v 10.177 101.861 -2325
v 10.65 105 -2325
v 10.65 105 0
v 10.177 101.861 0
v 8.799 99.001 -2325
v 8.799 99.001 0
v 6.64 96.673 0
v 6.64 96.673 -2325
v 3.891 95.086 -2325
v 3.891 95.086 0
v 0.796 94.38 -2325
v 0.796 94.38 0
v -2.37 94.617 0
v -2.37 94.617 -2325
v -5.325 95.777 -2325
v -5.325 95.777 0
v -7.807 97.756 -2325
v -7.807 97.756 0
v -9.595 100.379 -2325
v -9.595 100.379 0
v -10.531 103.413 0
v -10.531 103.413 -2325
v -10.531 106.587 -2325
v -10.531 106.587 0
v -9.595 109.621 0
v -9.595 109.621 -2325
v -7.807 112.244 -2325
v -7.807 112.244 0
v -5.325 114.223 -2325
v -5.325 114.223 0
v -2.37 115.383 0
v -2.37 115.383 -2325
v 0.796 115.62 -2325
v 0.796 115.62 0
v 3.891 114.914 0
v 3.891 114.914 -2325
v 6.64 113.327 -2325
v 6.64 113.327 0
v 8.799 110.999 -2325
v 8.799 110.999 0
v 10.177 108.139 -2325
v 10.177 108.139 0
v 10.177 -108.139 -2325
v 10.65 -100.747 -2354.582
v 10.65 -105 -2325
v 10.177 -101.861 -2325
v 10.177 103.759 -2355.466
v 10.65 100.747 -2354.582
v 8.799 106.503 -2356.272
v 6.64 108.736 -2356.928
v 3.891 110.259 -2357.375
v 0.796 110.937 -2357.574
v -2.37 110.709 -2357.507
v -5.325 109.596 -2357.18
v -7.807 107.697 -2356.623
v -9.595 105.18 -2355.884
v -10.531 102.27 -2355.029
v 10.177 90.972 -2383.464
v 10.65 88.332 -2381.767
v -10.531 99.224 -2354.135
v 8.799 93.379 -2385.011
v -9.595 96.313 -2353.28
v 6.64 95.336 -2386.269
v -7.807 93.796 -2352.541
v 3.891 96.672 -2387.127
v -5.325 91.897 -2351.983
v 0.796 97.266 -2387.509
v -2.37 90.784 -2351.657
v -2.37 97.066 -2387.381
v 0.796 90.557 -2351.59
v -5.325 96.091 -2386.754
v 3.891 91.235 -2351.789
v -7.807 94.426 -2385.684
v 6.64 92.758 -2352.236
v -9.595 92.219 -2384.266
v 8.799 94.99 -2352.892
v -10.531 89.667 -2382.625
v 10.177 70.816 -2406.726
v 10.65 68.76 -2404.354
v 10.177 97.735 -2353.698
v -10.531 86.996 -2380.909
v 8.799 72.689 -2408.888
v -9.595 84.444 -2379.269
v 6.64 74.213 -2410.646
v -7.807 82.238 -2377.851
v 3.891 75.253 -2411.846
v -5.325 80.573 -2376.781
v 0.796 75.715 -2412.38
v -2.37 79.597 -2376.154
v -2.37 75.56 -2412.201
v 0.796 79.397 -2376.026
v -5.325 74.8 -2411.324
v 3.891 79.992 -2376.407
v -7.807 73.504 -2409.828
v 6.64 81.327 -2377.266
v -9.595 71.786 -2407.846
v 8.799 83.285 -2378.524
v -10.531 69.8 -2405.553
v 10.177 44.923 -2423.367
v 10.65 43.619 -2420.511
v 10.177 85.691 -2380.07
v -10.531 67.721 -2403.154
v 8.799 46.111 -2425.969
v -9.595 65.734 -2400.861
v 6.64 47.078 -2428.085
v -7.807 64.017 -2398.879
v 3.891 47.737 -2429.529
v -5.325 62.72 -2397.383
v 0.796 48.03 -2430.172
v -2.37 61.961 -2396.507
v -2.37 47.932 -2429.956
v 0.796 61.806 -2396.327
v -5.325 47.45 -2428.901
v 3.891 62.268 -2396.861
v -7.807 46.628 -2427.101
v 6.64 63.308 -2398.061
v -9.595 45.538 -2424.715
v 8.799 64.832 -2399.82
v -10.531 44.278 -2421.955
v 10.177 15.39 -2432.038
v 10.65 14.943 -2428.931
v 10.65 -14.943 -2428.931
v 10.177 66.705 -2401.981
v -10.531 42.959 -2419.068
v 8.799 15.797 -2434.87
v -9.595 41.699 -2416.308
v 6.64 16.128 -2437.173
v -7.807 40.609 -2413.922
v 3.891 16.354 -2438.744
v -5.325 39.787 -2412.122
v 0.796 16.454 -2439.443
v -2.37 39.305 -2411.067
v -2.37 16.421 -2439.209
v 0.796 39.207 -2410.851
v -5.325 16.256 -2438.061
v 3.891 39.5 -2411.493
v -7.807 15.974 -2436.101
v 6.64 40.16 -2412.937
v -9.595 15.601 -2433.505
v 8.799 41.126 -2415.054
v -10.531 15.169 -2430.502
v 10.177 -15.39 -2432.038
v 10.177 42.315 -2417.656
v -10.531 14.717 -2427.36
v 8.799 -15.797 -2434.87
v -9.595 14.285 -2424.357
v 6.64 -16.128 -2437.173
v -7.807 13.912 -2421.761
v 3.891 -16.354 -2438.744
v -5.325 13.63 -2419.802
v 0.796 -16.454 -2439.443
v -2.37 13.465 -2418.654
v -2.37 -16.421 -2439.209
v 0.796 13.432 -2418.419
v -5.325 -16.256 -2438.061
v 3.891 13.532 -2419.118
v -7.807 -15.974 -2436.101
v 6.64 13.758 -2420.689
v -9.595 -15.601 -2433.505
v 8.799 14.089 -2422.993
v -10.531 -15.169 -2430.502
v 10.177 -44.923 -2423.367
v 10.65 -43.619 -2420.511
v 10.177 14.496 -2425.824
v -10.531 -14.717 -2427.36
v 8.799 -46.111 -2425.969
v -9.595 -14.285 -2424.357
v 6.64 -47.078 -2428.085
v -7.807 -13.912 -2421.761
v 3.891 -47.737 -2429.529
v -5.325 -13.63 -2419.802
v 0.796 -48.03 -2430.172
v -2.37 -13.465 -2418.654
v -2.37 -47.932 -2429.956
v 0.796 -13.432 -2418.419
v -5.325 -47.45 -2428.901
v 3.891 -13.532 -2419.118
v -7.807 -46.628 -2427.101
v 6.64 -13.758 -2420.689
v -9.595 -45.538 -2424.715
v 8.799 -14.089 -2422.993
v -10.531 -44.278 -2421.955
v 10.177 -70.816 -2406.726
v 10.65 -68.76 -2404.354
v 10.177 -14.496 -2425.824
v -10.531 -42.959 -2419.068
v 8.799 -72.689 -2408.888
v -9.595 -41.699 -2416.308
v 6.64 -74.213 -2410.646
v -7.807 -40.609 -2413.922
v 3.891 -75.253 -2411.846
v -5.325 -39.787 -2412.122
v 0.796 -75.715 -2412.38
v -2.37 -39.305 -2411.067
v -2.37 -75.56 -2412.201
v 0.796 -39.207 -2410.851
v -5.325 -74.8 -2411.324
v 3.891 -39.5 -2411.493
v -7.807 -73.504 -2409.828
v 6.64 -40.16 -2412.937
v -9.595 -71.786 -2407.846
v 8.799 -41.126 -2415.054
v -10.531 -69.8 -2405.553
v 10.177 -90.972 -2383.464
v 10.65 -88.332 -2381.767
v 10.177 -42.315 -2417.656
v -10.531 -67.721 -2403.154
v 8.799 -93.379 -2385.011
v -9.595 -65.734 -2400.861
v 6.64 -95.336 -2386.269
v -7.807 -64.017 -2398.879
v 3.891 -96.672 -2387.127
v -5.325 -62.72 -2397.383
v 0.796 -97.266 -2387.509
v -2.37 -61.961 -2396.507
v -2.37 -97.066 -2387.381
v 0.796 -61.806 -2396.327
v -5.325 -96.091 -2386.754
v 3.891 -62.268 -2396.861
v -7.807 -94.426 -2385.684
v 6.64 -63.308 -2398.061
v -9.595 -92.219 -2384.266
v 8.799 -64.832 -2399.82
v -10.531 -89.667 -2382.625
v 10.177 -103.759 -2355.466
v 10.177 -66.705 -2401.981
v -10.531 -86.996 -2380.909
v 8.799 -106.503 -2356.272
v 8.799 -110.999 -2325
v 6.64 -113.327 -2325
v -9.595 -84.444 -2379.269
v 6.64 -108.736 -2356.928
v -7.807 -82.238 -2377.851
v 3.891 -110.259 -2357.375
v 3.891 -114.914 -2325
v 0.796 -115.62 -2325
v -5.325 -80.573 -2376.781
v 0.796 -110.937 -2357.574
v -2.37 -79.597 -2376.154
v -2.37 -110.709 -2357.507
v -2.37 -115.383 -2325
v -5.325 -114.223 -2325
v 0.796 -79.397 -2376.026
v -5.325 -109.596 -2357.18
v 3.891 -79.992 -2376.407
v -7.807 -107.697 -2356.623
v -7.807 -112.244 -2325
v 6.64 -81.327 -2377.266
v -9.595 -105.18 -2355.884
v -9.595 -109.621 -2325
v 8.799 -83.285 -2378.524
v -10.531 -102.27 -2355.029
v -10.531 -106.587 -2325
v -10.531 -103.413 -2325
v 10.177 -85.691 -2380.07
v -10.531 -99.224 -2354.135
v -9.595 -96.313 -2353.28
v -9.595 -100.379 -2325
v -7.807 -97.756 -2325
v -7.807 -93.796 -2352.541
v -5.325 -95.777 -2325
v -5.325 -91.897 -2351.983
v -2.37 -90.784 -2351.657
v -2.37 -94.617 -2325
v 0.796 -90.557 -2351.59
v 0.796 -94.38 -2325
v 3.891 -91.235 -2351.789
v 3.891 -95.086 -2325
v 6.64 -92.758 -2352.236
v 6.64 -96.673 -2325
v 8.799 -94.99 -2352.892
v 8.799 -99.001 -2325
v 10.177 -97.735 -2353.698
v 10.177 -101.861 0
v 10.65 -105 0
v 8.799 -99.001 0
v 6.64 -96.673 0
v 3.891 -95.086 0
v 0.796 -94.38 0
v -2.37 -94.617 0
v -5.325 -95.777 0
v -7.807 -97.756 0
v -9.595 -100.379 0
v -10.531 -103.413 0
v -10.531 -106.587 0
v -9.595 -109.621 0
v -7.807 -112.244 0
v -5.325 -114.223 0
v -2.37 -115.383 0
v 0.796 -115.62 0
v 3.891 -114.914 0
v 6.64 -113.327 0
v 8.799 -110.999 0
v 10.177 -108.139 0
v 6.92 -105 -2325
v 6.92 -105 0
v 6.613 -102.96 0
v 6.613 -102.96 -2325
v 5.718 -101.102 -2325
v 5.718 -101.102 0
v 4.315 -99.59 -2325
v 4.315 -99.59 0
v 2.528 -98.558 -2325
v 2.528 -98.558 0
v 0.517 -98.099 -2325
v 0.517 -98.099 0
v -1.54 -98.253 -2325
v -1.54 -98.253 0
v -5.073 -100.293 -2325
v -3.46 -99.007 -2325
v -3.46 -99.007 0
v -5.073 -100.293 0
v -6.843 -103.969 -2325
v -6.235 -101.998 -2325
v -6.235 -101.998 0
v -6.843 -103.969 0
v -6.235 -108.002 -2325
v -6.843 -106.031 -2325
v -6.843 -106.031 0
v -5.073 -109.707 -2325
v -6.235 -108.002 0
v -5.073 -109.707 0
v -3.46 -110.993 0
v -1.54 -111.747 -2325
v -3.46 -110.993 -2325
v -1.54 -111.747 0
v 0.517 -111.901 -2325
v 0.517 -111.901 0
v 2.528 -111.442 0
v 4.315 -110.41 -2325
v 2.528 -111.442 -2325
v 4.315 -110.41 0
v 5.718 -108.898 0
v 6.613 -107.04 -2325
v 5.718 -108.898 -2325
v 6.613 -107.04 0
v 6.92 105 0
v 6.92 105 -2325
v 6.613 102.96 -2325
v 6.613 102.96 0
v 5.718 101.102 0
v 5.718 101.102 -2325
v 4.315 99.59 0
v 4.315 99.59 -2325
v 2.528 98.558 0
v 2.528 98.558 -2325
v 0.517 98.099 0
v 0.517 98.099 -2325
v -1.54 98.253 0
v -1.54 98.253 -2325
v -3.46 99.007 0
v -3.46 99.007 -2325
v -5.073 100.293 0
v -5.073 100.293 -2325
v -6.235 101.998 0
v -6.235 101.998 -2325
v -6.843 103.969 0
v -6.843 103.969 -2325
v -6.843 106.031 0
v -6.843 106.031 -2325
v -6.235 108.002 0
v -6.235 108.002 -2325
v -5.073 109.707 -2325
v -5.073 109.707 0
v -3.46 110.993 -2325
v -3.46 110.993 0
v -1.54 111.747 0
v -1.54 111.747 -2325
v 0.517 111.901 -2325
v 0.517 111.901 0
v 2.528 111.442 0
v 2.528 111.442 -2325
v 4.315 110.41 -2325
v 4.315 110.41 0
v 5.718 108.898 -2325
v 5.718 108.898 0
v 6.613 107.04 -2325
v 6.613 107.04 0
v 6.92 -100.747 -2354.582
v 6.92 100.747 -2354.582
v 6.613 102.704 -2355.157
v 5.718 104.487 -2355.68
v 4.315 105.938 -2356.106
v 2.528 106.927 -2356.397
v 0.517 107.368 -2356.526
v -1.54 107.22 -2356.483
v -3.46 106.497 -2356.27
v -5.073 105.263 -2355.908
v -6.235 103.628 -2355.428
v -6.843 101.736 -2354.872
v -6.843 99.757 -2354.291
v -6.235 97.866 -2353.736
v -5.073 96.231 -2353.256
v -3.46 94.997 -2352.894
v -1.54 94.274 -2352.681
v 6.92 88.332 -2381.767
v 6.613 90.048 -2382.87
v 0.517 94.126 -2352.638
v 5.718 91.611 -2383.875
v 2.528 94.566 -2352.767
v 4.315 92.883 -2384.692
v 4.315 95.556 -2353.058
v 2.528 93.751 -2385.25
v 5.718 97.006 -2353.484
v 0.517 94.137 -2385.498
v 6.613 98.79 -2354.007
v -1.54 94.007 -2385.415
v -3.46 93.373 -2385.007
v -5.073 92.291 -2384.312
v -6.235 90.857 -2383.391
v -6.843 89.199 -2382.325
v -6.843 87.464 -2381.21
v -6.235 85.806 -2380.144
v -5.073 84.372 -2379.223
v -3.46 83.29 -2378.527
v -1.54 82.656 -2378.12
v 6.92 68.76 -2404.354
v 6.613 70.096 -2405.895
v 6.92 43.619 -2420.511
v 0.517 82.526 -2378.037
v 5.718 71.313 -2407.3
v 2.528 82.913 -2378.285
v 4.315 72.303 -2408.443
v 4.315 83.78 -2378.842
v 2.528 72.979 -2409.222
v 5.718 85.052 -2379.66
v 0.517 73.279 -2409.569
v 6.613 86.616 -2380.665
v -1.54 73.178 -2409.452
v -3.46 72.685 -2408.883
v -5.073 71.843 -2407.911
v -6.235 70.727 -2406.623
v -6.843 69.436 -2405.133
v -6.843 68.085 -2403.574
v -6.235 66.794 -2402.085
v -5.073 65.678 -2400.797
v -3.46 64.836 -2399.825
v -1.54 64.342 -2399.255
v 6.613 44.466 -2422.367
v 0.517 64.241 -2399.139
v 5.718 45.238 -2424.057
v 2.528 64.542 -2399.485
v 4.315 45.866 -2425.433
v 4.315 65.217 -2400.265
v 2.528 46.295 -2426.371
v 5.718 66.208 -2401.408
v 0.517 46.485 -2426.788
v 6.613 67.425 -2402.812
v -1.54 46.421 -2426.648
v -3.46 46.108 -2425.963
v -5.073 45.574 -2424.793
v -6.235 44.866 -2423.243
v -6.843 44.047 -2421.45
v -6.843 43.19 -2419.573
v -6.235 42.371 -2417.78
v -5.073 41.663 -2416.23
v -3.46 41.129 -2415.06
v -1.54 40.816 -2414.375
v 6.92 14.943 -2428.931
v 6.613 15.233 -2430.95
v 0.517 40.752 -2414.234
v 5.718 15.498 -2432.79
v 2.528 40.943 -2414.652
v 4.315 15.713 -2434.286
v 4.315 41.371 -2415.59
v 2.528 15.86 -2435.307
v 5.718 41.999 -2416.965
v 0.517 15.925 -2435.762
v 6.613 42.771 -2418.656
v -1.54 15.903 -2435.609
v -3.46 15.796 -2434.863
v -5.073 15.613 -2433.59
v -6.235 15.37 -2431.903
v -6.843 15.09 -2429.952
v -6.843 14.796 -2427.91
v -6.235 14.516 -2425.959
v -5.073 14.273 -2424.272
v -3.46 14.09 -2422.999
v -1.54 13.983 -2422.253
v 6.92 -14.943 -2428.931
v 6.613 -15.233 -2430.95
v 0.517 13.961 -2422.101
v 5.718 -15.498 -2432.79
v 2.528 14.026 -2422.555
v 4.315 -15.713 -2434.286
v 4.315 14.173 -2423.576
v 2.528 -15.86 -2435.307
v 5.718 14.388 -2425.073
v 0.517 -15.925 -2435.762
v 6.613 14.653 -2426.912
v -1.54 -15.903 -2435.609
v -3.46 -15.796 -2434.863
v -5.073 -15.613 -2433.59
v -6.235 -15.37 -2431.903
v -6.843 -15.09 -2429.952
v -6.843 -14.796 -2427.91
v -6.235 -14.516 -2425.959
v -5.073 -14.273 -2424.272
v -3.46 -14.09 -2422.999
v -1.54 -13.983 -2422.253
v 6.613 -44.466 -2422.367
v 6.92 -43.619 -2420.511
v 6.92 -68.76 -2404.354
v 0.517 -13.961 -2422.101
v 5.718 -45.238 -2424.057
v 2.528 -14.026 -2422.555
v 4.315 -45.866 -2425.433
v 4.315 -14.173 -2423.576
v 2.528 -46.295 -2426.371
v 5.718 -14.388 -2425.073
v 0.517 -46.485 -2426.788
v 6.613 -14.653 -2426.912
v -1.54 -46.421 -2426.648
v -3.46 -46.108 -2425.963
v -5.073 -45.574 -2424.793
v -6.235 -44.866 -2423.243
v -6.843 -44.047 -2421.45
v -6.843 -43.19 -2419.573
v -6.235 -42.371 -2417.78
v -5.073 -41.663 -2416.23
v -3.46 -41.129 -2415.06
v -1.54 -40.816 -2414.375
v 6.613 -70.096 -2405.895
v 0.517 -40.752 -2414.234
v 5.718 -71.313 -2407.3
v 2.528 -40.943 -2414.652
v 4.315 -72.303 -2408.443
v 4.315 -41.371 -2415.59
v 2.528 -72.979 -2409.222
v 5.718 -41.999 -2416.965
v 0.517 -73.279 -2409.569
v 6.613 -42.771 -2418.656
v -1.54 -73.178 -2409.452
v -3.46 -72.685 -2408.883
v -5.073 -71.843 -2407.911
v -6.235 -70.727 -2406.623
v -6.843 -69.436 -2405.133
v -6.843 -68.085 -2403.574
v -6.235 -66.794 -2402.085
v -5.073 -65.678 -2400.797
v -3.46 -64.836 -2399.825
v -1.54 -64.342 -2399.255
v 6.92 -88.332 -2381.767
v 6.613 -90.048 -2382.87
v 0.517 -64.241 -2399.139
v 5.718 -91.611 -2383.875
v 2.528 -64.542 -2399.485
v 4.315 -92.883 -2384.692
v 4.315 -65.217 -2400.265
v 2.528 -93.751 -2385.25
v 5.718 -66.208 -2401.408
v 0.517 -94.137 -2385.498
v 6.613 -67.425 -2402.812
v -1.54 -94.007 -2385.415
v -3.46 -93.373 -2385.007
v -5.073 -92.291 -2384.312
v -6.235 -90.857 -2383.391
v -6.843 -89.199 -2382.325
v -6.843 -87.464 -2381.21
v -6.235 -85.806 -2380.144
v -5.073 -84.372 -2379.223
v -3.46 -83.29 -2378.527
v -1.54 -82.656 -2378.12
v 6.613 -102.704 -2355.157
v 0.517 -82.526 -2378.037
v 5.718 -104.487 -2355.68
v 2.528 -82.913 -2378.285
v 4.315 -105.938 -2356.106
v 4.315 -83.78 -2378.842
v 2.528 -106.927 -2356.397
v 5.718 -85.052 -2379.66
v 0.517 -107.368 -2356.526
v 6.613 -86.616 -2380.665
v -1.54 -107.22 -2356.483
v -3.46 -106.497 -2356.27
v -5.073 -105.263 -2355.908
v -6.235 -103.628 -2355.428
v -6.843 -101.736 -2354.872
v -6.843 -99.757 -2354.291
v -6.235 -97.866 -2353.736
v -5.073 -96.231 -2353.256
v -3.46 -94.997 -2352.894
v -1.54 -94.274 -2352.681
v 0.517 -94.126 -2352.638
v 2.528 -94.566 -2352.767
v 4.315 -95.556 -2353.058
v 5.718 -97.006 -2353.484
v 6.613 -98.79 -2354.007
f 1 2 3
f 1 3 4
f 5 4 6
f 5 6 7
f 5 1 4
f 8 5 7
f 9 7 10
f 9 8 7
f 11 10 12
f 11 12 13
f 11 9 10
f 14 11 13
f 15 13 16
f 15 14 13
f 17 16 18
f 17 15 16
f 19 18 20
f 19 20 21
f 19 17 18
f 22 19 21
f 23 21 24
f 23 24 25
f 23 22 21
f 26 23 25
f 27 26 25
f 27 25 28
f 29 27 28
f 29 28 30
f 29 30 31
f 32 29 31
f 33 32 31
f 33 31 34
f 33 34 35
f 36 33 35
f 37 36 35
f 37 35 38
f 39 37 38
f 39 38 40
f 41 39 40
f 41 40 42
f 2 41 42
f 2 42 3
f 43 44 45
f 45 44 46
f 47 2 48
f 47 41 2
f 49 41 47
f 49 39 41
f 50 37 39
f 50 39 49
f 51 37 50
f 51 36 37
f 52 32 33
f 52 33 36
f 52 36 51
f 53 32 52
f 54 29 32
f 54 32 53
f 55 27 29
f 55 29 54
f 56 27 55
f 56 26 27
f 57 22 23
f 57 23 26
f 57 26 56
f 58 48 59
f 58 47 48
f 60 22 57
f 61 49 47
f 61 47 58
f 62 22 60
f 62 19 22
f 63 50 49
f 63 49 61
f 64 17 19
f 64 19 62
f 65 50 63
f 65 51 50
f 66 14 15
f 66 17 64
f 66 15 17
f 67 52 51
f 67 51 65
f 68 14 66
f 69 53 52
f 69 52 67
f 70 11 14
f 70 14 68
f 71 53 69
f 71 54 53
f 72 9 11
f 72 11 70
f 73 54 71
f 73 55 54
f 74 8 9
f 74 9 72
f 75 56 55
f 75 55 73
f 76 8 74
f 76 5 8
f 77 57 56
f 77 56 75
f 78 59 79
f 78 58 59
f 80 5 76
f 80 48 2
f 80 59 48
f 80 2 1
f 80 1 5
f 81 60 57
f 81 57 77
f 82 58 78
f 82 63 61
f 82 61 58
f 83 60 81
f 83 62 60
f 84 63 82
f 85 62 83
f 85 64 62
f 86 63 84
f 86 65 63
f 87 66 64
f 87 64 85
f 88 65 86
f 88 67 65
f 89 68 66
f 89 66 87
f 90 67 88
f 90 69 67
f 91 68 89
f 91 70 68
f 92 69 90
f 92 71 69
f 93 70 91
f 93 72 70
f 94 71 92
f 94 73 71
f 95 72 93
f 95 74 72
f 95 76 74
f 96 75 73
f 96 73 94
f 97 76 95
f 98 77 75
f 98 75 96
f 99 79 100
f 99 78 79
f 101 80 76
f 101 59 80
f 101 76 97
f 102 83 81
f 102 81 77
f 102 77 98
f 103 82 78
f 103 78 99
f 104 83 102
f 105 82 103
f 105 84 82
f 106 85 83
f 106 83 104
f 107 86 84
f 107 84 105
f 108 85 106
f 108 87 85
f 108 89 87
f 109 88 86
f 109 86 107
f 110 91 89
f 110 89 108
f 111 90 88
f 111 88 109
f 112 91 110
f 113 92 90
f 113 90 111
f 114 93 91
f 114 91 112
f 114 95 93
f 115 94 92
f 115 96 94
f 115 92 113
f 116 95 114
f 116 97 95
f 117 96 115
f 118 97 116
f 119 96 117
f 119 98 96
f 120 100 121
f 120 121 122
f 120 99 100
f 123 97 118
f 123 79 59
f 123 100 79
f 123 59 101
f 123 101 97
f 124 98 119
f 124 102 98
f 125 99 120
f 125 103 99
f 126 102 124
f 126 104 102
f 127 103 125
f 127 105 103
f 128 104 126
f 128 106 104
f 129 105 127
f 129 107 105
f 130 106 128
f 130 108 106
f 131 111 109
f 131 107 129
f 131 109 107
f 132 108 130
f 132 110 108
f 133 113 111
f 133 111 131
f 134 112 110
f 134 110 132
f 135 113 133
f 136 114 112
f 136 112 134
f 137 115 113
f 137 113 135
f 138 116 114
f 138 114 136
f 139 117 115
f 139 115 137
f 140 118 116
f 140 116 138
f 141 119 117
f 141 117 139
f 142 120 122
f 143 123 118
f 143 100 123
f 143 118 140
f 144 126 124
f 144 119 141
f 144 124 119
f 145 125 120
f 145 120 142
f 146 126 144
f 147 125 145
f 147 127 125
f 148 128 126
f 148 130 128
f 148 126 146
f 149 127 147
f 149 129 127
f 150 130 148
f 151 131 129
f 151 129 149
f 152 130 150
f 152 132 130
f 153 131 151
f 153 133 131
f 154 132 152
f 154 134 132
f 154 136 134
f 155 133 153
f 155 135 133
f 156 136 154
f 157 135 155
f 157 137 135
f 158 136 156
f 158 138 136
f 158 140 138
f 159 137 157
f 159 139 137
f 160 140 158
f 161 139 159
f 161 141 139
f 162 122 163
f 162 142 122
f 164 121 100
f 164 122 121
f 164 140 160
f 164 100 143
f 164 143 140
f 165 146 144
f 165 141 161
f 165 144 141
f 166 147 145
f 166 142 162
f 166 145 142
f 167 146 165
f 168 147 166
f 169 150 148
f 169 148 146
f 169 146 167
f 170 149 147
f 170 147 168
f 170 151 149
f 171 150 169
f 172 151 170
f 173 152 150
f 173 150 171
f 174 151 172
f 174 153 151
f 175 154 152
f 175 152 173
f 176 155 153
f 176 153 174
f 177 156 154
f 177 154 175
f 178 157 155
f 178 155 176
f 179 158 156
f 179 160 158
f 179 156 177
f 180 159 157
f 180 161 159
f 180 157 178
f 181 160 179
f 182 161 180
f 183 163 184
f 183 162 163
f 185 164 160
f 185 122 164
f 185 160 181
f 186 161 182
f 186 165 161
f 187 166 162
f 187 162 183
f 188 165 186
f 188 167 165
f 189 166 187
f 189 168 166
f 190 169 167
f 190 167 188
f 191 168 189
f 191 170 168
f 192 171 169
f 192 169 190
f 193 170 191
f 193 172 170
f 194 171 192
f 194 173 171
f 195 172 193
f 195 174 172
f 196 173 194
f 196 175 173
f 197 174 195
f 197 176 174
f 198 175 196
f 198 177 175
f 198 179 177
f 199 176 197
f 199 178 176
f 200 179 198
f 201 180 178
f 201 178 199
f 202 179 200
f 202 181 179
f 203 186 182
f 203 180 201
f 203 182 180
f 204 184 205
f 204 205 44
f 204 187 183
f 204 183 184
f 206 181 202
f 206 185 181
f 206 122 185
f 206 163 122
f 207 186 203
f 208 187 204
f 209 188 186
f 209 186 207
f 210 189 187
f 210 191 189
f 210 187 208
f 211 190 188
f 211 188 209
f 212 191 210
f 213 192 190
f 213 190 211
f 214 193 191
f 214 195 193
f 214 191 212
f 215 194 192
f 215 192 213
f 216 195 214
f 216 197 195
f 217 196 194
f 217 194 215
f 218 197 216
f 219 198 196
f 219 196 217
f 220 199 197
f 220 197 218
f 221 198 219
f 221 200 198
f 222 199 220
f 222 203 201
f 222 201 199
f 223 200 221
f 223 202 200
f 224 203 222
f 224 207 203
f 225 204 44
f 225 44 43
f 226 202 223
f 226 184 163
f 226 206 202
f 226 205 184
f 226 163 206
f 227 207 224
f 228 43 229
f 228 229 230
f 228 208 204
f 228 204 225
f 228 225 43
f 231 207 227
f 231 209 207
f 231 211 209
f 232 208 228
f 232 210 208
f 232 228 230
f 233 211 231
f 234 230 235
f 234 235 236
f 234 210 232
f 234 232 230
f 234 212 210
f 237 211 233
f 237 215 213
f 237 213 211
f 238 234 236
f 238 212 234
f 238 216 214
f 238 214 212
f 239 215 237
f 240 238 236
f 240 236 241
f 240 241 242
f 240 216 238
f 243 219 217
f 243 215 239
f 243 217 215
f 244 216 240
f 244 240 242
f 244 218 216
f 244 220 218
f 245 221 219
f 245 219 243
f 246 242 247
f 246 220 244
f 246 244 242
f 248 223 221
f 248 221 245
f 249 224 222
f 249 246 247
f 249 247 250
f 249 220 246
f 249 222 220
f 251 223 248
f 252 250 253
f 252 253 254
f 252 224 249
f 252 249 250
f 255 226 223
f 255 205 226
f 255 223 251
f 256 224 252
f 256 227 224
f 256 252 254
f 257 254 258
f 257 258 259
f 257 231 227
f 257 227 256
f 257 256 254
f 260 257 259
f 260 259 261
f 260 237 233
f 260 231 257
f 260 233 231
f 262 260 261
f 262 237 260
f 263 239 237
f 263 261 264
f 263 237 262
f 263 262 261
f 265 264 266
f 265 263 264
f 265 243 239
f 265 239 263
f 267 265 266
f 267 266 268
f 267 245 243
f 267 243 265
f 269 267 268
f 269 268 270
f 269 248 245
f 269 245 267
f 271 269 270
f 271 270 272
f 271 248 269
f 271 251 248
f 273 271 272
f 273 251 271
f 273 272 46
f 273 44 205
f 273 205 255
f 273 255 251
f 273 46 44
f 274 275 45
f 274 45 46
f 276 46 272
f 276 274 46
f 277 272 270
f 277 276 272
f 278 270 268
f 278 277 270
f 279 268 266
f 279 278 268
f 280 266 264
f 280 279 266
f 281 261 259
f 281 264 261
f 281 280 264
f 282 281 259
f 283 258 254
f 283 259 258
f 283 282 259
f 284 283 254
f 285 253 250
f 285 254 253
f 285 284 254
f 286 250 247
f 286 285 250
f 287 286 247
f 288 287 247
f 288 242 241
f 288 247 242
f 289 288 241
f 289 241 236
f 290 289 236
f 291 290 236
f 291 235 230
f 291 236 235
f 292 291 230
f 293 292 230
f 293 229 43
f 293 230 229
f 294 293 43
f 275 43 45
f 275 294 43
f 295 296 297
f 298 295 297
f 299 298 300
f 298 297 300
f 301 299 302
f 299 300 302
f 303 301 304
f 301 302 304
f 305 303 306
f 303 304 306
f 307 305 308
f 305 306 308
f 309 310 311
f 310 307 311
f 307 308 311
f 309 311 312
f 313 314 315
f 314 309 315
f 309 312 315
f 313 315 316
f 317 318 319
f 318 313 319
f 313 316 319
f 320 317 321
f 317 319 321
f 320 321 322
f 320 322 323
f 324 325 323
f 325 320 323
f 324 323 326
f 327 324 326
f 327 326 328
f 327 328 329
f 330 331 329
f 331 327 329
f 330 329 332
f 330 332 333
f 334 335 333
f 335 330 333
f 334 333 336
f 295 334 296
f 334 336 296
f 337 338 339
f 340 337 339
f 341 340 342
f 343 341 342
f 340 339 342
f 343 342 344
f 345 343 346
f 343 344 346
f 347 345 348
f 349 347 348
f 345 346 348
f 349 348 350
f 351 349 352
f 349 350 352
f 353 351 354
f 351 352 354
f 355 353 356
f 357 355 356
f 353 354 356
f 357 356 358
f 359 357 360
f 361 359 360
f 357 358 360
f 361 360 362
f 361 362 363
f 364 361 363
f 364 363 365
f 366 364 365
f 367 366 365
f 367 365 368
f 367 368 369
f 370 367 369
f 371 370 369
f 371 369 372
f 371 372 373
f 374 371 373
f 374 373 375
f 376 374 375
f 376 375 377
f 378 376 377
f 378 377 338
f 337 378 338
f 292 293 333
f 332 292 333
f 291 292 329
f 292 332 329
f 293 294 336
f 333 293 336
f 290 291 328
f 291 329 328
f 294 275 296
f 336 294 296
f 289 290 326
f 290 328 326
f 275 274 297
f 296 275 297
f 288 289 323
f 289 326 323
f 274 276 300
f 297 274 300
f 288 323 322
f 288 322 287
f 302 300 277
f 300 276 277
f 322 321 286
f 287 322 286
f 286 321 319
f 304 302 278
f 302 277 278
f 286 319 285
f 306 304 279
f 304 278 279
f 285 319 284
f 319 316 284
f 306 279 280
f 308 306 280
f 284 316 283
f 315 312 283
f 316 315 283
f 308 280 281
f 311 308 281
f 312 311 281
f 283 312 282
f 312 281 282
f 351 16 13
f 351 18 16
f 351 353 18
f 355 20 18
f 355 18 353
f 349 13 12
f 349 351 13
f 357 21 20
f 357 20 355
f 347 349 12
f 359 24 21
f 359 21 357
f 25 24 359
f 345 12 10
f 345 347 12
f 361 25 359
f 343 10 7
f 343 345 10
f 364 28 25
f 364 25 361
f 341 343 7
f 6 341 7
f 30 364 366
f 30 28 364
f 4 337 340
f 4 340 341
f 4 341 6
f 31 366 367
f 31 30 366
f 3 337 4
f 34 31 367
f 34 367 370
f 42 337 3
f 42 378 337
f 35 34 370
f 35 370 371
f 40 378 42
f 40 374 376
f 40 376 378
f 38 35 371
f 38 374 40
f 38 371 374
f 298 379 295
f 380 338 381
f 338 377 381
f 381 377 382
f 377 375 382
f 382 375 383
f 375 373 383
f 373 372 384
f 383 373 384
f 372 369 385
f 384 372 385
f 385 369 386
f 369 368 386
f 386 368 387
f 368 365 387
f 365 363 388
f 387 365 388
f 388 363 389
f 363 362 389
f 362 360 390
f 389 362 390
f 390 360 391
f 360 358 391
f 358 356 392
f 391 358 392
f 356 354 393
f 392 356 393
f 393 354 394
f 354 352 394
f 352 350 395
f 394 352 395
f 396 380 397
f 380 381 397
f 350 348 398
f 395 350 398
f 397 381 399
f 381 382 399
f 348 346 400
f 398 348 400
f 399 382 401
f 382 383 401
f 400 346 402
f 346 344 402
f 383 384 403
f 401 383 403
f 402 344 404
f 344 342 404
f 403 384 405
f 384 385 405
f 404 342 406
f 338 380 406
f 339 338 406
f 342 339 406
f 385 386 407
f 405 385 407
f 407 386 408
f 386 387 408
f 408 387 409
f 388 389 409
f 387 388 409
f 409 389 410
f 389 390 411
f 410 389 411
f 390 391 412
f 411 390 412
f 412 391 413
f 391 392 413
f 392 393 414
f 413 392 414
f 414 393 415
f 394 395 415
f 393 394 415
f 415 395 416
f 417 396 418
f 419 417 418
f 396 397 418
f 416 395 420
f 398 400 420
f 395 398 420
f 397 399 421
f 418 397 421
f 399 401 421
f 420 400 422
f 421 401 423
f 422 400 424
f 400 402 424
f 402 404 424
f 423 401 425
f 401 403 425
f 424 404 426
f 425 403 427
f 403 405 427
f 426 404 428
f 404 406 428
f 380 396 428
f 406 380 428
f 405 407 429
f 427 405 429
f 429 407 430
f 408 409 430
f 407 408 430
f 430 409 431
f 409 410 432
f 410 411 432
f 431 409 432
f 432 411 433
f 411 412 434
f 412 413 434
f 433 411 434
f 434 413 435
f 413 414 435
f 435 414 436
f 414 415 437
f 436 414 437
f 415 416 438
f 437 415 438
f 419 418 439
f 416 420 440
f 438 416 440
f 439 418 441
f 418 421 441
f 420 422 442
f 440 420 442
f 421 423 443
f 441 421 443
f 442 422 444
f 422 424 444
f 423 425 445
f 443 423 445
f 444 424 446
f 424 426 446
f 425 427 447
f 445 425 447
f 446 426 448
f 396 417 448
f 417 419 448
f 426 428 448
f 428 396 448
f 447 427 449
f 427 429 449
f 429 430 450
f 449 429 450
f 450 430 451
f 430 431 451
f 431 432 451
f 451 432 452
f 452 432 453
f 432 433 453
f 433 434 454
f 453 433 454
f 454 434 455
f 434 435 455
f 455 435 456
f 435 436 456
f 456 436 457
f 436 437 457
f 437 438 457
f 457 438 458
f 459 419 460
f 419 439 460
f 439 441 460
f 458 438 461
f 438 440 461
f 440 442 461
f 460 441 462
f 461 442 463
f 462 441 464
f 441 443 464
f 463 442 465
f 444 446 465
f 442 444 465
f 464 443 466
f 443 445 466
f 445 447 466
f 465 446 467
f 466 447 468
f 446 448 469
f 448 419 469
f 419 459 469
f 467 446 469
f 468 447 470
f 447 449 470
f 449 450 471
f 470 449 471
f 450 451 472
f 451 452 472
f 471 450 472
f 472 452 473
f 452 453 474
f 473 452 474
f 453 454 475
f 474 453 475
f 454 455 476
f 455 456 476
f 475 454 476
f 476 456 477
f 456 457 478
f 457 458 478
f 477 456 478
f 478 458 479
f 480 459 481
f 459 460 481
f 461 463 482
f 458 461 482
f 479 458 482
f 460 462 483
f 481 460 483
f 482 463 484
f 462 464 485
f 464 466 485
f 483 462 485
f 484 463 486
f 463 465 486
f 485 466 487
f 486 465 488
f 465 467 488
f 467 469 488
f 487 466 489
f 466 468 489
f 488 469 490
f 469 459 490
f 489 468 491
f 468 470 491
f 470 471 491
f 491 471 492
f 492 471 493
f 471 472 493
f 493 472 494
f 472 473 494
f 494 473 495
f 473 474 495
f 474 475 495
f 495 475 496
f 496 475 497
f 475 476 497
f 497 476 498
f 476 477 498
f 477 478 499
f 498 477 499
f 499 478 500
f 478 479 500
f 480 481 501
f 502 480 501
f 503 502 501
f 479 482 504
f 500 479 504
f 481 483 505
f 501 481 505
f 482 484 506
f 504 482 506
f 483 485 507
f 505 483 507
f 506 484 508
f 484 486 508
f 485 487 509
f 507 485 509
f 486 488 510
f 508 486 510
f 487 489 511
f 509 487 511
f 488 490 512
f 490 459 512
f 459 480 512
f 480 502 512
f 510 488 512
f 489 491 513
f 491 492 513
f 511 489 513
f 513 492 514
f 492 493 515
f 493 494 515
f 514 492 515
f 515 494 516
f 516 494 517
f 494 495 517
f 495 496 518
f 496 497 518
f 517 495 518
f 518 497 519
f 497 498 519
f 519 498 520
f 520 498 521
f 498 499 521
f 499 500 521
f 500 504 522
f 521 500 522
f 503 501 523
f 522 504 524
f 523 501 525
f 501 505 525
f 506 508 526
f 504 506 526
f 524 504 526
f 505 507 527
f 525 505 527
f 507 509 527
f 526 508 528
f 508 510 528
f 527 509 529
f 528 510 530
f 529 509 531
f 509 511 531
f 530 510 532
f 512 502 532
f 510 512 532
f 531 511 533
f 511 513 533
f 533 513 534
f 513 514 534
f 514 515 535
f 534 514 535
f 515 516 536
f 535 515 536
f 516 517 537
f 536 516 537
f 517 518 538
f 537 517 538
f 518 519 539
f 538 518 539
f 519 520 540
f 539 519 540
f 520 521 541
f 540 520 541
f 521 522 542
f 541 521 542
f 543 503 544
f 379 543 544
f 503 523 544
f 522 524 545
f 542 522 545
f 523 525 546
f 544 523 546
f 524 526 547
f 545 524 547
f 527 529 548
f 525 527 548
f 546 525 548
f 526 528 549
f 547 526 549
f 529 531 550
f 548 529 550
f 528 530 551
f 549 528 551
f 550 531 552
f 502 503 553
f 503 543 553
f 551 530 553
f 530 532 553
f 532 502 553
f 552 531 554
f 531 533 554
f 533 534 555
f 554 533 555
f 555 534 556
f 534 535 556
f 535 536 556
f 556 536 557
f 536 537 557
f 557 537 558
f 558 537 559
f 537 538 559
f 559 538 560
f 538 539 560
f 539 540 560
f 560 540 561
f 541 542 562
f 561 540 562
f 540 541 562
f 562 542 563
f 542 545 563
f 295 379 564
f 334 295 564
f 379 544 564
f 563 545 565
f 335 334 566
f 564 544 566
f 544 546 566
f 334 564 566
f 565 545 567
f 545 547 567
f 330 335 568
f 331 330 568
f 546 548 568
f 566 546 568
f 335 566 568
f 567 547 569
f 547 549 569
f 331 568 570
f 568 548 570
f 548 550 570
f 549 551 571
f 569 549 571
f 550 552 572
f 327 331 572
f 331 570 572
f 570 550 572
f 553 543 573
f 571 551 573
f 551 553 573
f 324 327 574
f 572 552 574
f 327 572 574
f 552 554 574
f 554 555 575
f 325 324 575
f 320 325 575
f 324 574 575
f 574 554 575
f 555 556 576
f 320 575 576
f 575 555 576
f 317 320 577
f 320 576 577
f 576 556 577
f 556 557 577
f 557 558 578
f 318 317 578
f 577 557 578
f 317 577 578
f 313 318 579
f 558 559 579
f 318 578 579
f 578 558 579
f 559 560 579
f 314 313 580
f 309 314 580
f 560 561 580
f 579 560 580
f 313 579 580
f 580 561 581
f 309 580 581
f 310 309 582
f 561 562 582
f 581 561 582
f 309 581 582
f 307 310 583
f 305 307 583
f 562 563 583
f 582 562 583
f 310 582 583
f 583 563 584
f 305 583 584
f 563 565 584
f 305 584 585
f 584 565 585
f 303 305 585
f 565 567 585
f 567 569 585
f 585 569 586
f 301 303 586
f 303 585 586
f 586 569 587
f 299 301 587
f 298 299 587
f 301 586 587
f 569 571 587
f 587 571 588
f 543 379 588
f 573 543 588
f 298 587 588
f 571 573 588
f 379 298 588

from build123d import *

# Parameters (mm, degrees)
SKETCH2_R   = 10.65
SKETCH2_R_2 = 6.92


with BuildPart() as part:
    # Sweep1: sweep along a path in Sketch1
    with BuildLine(Plane(origin=(0, 0, 0), x_dir=(0, 0, -1), z_dir=(1, 0, 0))) as sweep1_path:
        Line((0, 105), (2325, 105))
        ThreePointArc((2325, 105), (2430, 0), (2325, -105))
        Line((2325, -105), (0, -105))
    # Sketch2 → Sweep1 (sweep)
    with BuildSketch(Plane.XY):
        with Locations((0, 105)):
            Circle(SKETCH2_R)
        with Locations((0, 105)):
            Circle(SKETCH2_R_2, mode=Mode.SUBTRACT)
    sweep(path=sweep1_path.line)


solid = part.part
